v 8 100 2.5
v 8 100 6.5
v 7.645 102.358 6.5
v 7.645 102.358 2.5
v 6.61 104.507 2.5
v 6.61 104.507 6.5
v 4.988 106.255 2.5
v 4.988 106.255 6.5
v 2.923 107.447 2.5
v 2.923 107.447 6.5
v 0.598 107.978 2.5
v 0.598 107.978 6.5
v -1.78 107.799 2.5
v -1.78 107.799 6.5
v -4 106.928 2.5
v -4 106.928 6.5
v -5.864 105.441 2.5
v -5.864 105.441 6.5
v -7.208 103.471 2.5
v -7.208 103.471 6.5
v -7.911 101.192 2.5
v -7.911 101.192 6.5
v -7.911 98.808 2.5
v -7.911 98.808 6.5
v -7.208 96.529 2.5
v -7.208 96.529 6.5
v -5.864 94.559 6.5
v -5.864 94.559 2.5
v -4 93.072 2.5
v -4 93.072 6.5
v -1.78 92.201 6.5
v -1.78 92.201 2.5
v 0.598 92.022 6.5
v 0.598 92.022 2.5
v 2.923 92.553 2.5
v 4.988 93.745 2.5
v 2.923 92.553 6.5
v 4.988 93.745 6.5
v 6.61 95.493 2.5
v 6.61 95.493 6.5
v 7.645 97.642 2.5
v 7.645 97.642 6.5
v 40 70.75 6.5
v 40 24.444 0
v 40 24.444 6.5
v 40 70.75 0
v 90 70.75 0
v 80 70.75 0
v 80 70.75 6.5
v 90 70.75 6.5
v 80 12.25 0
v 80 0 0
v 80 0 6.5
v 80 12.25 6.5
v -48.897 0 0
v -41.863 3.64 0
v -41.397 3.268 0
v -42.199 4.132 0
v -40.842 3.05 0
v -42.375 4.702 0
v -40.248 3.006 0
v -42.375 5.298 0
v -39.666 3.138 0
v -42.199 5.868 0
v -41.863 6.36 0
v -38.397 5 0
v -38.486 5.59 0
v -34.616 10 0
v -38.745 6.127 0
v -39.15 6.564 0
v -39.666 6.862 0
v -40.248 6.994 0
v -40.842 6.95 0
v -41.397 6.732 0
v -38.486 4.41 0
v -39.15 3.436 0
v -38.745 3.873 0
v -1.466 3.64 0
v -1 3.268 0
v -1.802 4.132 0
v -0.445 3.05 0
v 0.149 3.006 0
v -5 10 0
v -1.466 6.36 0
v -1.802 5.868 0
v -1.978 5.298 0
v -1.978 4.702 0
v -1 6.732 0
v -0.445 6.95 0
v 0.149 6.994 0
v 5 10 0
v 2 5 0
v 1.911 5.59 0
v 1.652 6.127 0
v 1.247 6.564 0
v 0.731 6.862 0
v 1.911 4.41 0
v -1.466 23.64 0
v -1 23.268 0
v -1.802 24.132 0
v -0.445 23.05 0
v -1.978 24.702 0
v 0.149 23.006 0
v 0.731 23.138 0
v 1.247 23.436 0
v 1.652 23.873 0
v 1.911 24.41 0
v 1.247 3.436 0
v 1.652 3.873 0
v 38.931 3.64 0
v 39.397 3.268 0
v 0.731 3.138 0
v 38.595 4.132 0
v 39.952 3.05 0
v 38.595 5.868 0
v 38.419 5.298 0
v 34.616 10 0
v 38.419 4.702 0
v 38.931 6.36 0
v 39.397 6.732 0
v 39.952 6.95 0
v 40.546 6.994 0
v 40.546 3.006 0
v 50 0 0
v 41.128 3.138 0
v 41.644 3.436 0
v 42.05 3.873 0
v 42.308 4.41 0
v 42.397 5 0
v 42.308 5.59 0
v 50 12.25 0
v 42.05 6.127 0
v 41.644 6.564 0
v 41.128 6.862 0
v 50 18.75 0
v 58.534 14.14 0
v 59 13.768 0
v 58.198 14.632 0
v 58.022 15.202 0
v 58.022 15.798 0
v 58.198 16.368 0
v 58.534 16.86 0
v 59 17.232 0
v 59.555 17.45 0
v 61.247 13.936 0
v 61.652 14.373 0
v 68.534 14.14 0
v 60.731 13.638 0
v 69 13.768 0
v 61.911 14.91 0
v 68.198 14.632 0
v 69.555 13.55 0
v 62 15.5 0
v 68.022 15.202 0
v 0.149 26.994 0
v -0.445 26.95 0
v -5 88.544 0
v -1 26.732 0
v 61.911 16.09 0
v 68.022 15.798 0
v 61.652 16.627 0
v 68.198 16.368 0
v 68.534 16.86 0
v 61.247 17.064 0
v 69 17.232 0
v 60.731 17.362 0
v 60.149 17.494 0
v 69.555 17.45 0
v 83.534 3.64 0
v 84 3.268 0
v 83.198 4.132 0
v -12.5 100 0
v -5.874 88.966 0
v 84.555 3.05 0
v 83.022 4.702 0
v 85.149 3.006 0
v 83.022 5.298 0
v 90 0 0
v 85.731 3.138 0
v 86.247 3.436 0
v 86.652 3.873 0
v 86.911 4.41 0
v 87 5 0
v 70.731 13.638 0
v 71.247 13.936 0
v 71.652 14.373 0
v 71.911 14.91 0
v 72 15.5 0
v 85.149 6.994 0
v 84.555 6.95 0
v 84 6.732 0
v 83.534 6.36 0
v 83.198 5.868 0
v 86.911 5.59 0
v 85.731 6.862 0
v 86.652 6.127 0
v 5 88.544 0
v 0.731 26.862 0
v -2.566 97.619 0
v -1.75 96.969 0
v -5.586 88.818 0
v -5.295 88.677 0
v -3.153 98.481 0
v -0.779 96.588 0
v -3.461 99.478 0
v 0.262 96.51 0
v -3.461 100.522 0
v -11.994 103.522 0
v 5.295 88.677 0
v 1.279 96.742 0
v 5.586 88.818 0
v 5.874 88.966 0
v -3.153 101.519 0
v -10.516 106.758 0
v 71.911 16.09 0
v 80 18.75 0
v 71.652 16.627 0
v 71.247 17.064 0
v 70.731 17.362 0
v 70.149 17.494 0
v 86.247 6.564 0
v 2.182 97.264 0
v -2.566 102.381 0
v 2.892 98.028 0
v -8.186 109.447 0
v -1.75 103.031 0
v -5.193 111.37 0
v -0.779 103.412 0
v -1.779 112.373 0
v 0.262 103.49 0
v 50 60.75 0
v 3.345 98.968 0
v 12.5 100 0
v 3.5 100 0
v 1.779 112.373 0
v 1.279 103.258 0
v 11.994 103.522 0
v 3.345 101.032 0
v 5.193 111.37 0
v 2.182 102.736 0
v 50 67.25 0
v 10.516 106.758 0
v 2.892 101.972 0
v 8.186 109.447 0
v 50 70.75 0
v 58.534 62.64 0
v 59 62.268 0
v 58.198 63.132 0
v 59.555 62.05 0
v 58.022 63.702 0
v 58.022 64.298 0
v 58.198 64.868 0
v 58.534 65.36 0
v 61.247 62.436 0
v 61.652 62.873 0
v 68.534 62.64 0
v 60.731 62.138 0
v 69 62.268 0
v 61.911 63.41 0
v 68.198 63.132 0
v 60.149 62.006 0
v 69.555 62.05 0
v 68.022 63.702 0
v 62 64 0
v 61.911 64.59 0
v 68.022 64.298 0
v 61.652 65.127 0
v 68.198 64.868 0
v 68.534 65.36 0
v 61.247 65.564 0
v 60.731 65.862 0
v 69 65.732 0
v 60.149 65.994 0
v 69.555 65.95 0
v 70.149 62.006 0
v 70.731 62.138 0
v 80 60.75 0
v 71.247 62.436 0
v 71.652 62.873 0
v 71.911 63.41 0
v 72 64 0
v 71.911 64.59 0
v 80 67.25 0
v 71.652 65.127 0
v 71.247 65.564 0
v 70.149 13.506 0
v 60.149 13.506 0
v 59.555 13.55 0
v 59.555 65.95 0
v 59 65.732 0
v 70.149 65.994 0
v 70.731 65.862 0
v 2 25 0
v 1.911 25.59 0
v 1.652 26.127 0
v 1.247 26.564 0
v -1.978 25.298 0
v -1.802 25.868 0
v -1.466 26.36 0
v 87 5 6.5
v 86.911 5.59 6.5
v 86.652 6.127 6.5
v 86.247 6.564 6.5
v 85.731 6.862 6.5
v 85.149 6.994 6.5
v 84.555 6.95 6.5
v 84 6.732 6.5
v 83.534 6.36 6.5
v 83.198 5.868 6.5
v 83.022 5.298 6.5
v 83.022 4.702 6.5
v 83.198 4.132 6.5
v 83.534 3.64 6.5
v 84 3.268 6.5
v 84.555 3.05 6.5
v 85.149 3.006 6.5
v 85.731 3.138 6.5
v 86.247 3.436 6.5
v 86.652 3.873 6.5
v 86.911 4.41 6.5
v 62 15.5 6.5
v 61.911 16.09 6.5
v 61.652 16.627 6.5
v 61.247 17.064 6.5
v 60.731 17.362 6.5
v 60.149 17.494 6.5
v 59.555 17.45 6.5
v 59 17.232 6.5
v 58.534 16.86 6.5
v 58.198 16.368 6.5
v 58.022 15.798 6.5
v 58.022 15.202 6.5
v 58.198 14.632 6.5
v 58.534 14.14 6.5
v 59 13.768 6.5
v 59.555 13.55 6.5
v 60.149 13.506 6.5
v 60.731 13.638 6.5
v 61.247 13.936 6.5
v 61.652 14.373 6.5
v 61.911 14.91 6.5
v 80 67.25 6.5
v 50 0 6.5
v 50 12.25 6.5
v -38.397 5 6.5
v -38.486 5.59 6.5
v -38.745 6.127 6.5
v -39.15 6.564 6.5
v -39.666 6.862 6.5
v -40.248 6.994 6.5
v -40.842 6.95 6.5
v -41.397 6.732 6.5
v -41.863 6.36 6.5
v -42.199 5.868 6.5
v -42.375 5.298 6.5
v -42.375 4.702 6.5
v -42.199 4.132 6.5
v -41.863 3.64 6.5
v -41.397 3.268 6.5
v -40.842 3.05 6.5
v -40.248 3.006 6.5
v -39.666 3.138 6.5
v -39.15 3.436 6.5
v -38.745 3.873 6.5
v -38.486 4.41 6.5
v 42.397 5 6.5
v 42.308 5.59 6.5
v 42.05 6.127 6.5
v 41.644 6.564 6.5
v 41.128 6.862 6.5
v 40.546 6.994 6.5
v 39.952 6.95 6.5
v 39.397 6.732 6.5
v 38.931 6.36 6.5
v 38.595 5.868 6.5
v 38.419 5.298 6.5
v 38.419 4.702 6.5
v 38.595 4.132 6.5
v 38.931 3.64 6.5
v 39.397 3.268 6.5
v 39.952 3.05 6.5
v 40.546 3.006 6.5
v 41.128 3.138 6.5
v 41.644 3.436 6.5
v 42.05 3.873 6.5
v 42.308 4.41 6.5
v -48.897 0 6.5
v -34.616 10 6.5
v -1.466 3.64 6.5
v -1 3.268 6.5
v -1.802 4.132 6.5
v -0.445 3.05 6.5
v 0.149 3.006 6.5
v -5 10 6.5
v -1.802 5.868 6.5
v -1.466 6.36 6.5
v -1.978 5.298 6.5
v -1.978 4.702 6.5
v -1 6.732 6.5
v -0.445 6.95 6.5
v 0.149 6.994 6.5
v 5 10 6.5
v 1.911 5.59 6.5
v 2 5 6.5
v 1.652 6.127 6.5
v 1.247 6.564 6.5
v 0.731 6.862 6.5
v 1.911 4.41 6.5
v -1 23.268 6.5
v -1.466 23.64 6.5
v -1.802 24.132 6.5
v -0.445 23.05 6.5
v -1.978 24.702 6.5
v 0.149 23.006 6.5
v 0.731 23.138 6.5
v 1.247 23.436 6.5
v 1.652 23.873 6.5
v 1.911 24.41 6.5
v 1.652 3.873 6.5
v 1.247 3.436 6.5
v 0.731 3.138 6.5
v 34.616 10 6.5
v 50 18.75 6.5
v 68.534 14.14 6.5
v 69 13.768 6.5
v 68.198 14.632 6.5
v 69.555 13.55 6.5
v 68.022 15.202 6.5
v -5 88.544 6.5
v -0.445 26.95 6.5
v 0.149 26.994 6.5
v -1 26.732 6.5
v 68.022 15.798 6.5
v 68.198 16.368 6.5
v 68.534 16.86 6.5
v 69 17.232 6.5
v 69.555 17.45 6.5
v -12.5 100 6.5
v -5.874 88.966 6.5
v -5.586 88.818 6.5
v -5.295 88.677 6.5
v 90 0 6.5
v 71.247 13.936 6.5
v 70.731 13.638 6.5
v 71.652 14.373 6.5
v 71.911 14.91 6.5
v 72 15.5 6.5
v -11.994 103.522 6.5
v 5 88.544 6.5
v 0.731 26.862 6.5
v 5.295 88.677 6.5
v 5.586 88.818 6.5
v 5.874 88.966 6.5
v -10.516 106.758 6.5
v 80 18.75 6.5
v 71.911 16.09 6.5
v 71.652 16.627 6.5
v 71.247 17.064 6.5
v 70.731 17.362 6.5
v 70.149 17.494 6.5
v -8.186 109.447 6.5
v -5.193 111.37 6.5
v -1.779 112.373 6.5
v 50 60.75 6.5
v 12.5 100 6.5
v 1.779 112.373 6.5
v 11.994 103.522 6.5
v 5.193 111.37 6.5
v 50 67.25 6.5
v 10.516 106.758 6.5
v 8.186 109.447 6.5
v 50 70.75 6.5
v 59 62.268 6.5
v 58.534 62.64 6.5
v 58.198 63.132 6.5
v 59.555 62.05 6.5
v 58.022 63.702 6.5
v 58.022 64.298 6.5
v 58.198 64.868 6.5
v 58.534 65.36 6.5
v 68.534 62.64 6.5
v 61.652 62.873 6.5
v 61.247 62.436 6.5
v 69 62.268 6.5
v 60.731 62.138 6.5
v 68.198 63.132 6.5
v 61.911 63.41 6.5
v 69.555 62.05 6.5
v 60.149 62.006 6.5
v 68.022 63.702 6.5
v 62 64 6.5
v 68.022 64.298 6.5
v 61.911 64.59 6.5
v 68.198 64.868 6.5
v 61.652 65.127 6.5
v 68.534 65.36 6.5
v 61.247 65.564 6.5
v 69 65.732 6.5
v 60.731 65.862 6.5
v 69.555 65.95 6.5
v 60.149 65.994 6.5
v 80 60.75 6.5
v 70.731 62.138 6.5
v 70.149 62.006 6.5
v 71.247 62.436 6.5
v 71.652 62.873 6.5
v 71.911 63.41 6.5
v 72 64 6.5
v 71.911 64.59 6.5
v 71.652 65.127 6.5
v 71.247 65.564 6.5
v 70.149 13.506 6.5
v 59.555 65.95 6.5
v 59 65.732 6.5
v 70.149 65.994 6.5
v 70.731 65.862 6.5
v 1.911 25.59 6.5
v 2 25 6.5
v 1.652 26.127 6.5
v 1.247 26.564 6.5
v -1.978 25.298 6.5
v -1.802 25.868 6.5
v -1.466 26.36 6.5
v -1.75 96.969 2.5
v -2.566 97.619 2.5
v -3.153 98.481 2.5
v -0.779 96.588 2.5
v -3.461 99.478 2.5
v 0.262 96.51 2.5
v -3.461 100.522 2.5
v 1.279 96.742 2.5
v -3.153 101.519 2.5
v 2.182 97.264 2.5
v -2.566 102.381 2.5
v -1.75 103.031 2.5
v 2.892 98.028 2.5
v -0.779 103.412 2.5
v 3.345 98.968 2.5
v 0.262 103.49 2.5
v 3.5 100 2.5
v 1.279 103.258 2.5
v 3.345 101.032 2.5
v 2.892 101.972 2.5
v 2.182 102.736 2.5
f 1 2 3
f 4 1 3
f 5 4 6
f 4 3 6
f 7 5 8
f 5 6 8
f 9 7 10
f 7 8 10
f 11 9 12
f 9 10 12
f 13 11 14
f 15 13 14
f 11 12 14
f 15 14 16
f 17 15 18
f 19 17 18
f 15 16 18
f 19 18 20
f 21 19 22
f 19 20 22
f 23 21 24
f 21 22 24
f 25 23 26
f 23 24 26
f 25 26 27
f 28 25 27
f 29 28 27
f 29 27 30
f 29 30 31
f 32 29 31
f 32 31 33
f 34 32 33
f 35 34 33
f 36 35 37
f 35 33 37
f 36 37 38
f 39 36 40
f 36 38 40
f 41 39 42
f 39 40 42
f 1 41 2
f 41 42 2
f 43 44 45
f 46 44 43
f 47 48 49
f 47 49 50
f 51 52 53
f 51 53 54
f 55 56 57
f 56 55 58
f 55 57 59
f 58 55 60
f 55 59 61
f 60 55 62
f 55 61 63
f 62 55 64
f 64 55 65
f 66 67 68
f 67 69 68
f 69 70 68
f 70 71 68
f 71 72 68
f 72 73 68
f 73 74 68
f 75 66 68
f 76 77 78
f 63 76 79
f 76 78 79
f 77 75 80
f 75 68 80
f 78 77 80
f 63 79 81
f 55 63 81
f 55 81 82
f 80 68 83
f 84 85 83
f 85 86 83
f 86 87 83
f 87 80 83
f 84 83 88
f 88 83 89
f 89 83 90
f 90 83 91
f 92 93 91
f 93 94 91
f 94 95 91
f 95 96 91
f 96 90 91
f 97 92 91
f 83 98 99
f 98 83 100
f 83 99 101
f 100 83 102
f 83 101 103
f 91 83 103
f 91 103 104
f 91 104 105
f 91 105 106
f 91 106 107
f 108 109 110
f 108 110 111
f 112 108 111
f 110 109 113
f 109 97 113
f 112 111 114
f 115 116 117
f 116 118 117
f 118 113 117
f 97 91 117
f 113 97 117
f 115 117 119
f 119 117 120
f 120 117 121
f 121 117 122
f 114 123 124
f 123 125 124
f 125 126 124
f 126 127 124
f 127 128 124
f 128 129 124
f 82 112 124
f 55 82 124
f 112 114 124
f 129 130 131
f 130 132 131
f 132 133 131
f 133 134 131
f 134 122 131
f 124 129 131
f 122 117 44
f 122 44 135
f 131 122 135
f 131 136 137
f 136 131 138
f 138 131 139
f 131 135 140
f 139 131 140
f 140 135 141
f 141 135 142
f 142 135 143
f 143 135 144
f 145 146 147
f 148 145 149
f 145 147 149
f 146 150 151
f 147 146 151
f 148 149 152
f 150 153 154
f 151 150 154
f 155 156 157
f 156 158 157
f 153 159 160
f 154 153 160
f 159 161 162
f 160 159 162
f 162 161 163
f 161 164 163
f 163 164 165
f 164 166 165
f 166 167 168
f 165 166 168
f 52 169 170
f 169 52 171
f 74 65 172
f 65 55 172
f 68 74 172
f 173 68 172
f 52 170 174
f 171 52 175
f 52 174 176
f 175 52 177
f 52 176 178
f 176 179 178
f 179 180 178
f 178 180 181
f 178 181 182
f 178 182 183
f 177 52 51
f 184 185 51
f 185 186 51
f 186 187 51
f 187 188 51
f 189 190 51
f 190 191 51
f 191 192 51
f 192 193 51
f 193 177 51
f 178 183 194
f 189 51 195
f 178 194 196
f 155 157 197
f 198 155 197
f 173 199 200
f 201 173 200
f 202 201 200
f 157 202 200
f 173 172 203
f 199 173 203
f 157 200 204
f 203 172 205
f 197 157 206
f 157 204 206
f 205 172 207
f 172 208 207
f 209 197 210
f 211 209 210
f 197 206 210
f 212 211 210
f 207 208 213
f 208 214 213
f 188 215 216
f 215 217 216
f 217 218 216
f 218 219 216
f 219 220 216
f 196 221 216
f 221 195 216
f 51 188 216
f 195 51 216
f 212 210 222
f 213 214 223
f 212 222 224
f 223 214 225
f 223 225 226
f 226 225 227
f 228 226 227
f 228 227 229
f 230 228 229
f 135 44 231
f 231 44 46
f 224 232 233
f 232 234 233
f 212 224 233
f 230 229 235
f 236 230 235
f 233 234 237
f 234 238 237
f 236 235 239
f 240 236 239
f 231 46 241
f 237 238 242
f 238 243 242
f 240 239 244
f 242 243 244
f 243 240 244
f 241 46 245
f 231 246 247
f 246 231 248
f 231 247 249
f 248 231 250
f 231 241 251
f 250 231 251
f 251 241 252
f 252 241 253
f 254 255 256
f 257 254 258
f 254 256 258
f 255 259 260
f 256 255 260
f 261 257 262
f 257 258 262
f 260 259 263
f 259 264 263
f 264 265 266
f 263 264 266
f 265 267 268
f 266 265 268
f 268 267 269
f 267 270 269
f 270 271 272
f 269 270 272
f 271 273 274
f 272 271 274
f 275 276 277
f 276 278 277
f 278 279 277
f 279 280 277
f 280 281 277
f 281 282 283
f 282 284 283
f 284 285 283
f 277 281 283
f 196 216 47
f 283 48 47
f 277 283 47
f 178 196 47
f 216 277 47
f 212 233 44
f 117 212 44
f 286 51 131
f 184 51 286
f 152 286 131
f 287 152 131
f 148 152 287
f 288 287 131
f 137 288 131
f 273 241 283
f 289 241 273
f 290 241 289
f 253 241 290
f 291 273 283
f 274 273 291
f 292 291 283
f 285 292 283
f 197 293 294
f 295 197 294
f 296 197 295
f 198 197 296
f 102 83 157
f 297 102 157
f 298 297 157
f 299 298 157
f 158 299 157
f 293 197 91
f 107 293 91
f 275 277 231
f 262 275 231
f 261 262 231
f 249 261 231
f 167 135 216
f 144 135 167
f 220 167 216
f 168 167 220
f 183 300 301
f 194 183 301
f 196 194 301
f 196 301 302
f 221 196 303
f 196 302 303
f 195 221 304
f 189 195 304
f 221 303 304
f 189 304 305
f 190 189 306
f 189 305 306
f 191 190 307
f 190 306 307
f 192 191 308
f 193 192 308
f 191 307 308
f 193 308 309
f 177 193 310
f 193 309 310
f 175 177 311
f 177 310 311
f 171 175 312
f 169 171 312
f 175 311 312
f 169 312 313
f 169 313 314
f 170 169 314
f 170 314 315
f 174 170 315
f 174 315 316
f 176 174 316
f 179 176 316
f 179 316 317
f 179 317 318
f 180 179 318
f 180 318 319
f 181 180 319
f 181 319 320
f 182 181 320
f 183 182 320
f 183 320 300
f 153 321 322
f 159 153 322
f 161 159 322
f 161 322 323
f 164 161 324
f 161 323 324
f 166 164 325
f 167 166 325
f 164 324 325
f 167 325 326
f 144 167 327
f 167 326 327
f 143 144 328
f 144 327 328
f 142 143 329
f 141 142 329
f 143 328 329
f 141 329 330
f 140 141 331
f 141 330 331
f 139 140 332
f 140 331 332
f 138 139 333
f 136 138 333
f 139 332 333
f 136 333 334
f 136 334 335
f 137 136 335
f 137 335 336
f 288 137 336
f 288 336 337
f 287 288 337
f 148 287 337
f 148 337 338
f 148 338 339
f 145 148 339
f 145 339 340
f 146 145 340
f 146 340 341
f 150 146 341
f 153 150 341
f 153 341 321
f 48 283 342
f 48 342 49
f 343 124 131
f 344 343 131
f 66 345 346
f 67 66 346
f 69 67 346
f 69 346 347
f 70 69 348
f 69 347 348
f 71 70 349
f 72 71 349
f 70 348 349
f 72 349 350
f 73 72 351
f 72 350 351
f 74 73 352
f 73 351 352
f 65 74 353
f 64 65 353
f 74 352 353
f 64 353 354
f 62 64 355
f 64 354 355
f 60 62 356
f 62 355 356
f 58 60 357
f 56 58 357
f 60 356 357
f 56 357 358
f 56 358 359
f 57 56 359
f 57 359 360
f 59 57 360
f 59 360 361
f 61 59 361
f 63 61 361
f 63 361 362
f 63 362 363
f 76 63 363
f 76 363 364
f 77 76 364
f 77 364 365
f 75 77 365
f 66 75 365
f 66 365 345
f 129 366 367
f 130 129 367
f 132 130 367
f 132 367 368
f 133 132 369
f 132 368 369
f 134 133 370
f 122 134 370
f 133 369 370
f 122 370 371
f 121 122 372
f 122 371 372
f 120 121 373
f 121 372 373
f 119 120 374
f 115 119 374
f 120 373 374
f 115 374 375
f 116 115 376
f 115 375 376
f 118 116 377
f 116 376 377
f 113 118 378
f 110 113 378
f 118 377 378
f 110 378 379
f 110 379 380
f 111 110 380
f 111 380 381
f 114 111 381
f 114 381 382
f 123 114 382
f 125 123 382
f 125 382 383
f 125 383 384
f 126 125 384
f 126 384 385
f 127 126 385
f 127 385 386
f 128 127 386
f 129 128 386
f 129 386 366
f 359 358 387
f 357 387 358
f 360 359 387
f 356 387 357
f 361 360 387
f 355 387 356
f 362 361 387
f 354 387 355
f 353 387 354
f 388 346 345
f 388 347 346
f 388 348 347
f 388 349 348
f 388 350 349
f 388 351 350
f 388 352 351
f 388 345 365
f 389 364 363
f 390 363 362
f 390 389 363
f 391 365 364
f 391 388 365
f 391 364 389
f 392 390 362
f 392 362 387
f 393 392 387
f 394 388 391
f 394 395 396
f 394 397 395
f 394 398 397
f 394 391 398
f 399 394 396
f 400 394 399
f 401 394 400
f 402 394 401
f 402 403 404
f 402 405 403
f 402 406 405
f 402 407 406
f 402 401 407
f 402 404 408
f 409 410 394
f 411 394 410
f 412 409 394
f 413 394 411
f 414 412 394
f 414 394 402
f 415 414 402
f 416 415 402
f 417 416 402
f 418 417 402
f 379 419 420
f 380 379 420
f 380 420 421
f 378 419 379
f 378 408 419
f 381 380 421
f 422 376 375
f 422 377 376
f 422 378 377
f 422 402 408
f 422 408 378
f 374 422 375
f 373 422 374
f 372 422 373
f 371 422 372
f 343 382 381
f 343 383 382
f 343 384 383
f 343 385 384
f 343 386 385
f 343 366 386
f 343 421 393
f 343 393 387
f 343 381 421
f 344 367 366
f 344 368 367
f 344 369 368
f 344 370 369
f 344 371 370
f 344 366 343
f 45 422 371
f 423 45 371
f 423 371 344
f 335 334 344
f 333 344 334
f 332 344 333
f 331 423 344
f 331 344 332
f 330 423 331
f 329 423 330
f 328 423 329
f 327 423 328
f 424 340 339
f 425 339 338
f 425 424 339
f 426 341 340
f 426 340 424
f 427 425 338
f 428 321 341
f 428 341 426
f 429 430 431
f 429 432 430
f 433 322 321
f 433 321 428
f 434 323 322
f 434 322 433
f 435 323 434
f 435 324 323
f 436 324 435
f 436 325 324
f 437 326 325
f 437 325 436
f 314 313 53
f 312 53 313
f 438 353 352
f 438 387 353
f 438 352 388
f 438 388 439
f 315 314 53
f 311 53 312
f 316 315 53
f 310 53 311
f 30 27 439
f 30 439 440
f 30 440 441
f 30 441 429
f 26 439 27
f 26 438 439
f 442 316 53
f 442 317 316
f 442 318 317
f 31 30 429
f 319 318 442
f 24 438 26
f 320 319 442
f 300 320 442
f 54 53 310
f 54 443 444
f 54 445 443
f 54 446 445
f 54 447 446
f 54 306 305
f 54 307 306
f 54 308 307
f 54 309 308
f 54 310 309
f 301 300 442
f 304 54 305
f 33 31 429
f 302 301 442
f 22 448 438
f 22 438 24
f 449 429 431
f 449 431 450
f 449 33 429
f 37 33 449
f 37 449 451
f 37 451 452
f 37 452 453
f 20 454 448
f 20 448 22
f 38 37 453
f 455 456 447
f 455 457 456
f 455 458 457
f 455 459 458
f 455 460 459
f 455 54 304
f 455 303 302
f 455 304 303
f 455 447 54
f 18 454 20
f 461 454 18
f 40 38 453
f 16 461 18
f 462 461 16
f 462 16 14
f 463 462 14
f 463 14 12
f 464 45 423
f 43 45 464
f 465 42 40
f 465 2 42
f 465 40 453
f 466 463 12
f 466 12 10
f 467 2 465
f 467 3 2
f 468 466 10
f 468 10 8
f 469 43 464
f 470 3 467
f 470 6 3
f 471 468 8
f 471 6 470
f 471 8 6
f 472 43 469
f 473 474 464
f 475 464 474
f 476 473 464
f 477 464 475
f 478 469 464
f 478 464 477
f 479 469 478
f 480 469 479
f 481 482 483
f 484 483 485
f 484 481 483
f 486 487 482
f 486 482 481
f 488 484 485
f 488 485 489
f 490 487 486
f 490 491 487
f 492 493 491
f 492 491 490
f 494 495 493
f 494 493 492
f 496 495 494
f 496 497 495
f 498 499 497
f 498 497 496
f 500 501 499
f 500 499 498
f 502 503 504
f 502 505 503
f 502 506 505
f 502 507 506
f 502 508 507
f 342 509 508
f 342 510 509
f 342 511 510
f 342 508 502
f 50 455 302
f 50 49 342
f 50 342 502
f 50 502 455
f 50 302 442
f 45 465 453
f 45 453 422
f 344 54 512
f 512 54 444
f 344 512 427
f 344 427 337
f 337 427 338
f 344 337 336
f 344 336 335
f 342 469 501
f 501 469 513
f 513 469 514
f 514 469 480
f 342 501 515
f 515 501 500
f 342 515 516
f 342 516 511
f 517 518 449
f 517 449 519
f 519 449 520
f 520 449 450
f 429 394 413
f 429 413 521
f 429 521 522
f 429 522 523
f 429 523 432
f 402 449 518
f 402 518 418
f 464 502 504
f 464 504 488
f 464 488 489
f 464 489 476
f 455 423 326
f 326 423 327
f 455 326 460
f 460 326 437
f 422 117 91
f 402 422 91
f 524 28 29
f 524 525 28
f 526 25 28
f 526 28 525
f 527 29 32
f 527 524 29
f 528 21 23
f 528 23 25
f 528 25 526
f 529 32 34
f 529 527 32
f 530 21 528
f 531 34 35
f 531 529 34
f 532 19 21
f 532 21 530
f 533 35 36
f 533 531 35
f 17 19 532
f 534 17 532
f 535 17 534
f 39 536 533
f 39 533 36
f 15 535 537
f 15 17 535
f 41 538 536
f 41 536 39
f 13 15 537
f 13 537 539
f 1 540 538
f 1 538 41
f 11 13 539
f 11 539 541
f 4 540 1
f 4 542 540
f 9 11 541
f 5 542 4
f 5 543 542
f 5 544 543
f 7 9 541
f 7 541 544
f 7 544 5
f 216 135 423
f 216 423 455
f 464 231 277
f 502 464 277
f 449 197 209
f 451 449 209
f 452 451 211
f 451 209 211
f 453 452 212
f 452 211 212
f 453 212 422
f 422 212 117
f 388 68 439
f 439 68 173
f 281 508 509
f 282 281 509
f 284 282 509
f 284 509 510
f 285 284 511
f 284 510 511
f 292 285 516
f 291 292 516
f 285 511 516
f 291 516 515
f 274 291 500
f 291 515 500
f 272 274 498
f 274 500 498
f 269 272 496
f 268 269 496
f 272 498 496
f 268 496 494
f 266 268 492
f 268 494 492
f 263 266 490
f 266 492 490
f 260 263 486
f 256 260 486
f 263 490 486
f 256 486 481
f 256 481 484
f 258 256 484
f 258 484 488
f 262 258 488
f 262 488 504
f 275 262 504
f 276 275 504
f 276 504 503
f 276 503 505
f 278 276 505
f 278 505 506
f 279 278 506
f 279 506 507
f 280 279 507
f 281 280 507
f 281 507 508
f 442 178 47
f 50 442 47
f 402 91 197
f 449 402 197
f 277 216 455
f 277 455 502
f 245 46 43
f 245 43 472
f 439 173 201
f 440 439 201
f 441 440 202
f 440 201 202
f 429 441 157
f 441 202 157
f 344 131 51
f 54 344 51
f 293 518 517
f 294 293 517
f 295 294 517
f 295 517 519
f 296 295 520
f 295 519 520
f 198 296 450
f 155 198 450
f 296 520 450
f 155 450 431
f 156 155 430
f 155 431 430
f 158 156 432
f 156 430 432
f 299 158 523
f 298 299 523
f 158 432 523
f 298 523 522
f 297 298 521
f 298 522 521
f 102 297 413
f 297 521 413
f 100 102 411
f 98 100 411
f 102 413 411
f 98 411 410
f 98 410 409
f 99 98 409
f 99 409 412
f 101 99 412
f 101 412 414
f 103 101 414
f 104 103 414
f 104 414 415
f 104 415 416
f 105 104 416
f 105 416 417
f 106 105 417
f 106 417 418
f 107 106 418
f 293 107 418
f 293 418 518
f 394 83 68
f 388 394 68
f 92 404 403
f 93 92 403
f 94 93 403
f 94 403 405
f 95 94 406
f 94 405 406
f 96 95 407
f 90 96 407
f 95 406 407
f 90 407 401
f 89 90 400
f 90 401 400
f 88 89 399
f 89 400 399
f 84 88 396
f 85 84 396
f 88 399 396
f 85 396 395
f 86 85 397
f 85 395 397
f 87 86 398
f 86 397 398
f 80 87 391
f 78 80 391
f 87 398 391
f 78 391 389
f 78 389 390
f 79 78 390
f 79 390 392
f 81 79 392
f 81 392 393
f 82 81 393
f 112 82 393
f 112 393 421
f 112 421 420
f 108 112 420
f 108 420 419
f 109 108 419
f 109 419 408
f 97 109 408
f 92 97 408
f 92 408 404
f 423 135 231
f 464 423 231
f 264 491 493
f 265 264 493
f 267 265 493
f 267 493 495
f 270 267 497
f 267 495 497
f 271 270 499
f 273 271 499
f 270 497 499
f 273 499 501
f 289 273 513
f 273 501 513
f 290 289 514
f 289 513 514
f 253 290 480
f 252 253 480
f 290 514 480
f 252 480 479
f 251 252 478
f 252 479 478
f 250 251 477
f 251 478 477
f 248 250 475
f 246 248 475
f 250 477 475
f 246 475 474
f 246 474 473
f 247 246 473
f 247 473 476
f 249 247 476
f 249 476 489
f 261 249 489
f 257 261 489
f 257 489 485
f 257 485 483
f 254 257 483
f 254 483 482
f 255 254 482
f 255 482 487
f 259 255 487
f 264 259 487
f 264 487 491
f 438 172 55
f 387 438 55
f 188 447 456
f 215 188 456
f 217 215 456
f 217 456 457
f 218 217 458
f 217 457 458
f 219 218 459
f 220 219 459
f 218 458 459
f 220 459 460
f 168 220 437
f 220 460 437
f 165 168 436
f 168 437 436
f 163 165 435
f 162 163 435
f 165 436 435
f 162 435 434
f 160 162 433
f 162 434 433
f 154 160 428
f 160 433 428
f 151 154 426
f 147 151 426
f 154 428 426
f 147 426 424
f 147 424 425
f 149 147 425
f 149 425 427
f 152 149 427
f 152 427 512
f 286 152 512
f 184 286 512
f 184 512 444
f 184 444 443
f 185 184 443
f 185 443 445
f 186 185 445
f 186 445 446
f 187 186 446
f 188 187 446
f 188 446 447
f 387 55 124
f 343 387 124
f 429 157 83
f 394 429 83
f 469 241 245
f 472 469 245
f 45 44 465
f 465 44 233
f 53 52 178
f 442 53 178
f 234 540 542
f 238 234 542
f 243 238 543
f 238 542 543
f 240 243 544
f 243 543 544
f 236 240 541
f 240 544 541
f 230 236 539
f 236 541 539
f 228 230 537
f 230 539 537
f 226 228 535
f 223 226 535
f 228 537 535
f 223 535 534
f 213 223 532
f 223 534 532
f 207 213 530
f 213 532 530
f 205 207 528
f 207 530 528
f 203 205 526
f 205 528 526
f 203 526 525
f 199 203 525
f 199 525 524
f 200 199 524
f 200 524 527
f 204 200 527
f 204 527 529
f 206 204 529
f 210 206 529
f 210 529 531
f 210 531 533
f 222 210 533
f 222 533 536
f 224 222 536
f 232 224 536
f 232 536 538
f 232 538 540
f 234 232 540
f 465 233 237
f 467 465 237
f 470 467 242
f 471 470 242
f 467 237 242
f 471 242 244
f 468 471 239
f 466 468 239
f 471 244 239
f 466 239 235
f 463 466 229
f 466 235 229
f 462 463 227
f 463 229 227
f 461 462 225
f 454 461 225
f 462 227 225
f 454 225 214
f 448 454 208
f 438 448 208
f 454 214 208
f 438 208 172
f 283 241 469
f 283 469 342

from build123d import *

# Parameters (mm, degrees)
SKETCH1_R           = 12.5
SKETCH1_W           = 10
SKETCH1_H           = 70.75
SKETCH1_W_2         = 30
SKETCH1_H_2         = 6.5
BOSS_EXTRUDE1_DEPTH = 6.5
CUT_EXTRUDE1_REACH  = 146.217
SKETCH2_R           = 3.5
SKETCH2_3_R         = 8
SKETCH2_3_R_2       = 3.5
CUT_EXTRUDE2_DEPTH  = 4
CUT_EXTRUDE4_REACH  = 146.217
SKETCH3_R           = 2
CUT_EXTRUDE6_REACH  = 146.217
SKETCH5_R           = 2


with BuildPart() as part:
    # Sketch1 → Boss-Extrude1 (new body)
    with BuildSketch(Plane.XY):
        with Locations((0, 100)):
            Circle(SKETCH1_R)
        with BuildLine():
            Line((-48.897023427, 0), (48.897023427, 0))
            Line((48.897023427, 0), (12.5, 100))
            ThreePointArc((12.5, 100), (10.716279715, 93.564834962), (5.87418415, 88.966235431))
            Line((5.87418415, 88.966235431), (34.615543359, 10))
            Line((34.615543359, 10), (-34.615543359, 10))
            Line((-34.615543359, 10), (-5.87418415, 88.966235431))
            ThreePointArc((-5.87418415, 88.966235431), (-10.716279715, 93.564834962), (-12.5, 100))
            Line((-12.5, 100), (-48.897023427, 0))
        make_face()
        with BuildLine():
            Line((-5, 10), (5, 10))
            Line((5, 10), (5, 88.543560763))
            ThreePointArc((5, 88.543560763), (0, 87.5), (-5, 88.543560763))
            Line((-5, 88.543560763), (-5, 10))
        make_face()
        with Locations((85, 35.375)):
            Rectangle(SKETCH1_W, SKETCH1_H)
        with Locations((65, 15.5)):
            Rectangle(SKETCH1_W_2, SKETCH1_H_2)
        with Locations((65, 64)):
            Rectangle(SKETCH1_W_2, SKETCH1_H_2)
        with Locations((45, 35.375)):
            Rectangle(SKETCH1_W, SKETCH1_H)
    extrude(amount=BOSS_EXTRUDE1_DEPTH)

    # Sketch2 → Cut-Extrude1 (cut, up to next)
    with BuildSketch(Plane.XY.offset(6.5), mode=Mode.PRIVATE) as cut_extrude1_sk1:
        with Locations((0, 100)):
            Circle(SKETCH2_R)
    cut_extrude1_tool1 = extrude(cut_extrude1_sk1.sketch, amount=-CUT_EXTRUDE1_REACH, mode=Mode.PRIVATE) & part.part
    add(cut_extrude1_tool1.solids().sort_by_distance((0, 100, 6.5))[0], mode=Mode.SUBTRACT)

    # Sketch2<3> → Cut-Extrude2 (cut)
    with BuildSketch(Plane.XY.offset(6.5)):
        with Locations((0, 100)):
            Circle(SKETCH2_3_R)
        with Locations((0, 100)):
            Circle(SKETCH2_3_R_2, mode=Mode.SUBTRACT)
    extrude(amount=-CUT_EXTRUDE2_DEPTH, mode=Mode.SUBTRACT)

    # Sketch3 → Cut-Extrude4 (cut, up to next)
    with BuildSketch(Plane.XY.offset(6.5), mode=Mode.PRIVATE) as cut_extrude4_sk1:
        with Locations((0, 5)):
            Circle(SKETCH3_R)
    cut_extrude4_tool1 = extrude(cut_extrude4_sk1.sketch, amount=-CUT_EXTRUDE4_REACH, mode=Mode.PRIVATE) & part.part
    # Sketch3 → Cut-Extrude4 (cut, up to next)
    with BuildSketch(Plane.XY.offset(6.5), mode=Mode.PRIVATE) as cut_extrude4_sk2:
        with Locations((40.397023427, 5)):
            Circle(SKETCH3_R)
    cut_extrude4_tool2 = extrude(cut_extrude4_sk2.sketch, amount=-CUT_EXTRUDE4_REACH, mode=Mode.PRIVATE) & part.part
    # Sketch3 → Cut-Extrude4 (cut, up to next)
    with BuildSketch(Plane.XY.offset(6.5), mode=Mode.PRIVATE) as cut_extrude4_sk3:
        with Locations((-40.397023427, 5)):
            Circle(SKETCH3_R)
    cut_extrude4_tool3 = extrude(cut_extrude4_sk3.sketch, amount=-CUT_EXTRUDE4_REACH, mode=Mode.PRIVATE) & part.part
    # Sketch3 → Cut-Extrude4 (cut, up to next)
    with BuildSketch(Plane.XY.offset(6.5), mode=Mode.PRIVATE) as cut_extrude4_sk4:
        with Locations((0, 25)):
            Circle(SKETCH3_R)
    cut_extrude4_tool4 = extrude(cut_extrude4_sk4.sketch, amount=-CUT_EXTRUDE4_REACH, mode=Mode.PRIVATE) & part.part
    # Sketch3 → Cut-Extrude4 (cut, up to next)
    with BuildSketch(Plane.XY.offset(6.5), mode=Mode.PRIVATE) as cut_extrude4_sk5:
        with Locations((85, 5)):
            Circle(SKETCH3_R)
    cut_extrude4_tool5 = extrude(cut_extrude4_sk5.sketch, amount=-CUT_EXTRUDE4_REACH, mode=Mode.PRIVATE) & part.part
    add(cut_extrude4_tool1.solids().sort_by_distance((0, 5, 6.5))[0], mode=Mode.SUBTRACT)
    add(cut_extrude4_tool2.solids().sort_by_distance((40.397023, 5, 6.5))[0], mode=Mode.SUBTRACT)
    add(cut_extrude4_tool3.solids().sort_by_distance((-40.397023, 5, 6.5))[0], mode=Mode.SUBTRACT)
    add(cut_extrude4_tool4.solids().sort_by_distance((0, 25, 6.5))[0], mode=Mode.SUBTRACT)
    add(cut_extrude4_tool5.solids().sort_by_distance((85, 5, 6.5))[0], mode=Mode.SUBTRACT)

    # Sketch5 → Cut-Extrude6 (cut, up to next)
    with BuildSketch(Plane.XY.offset(6.5), mode=Mode.PRIVATE) as cut_extrude6_sk1:
        with Locations((60, 64)):
            Circle(SKETCH5_R)
    cut_extrude6_tool1 = extrude(cut_extrude6_sk1.sketch, amount=-CUT_EXTRUDE6_REACH, mode=Mode.PRIVATE) & part.part
    # Sketch5 → Cut-Extrude6 (cut, up to next)
    with BuildSketch(Plane.XY.offset(6.5), mode=Mode.PRIVATE) as cut_extrude6_sk2:
        with Locations((70, 64)):
            Circle(SKETCH5_R)
    cut_extrude6_tool2 = extrude(cut_extrude6_sk2.sketch, amount=-CUT_EXTRUDE6_REACH, mode=Mode.PRIVATE) & part.part
    # Sketch5 → Cut-Extrude6 (cut, up to next)
    with BuildSketch(Plane.XY.offset(6.5), mode=Mode.PRIVATE) as cut_extrude6_sk3:
        with Locations((70, 15.5)):
            Circle(SKETCH5_R)
    cut_extrude6_tool3 = extrude(cut_extrude6_sk3.sketch, amount=-CUT_EXTRUDE6_REACH, mode=Mode.PRIVATE) & part.part
    # Sketch5 → Cut-Extrude6 (cut, up to next)
    with BuildSketch(Plane.XY.offset(6.5), mode=Mode.PRIVATE) as cut_extrude6_sk4:
        with Locations((60, 15.5)):
            Circle(SKETCH5_R)
    cut_extrude6_tool4 = extrude(cut_extrude6_sk4.sketch, amount=-CUT_EXTRUDE6_REACH, mode=Mode.PRIVATE) & part.part
    add(cut_extrude6_tool1.solids().sort_by_distance((60, 64, 6.5))[0], mode=Mode.SUBTRACT)
    add(cut_extrude6_tool2.solids().sort_by_distance((70, 64, 6.5))[0], mode=Mode.SUBTRACT)
    add(cut_extrude6_tool3.solids().sort_by_distance((70, 15.5, 6.5))[0], mode=Mode.SUBTRACT)
    add(cut_extrude6_tool4.solids().sort_by_distance((60, 15.5, 6.5))[0], mode=Mode.SUBTRACT)


solid = part.part
